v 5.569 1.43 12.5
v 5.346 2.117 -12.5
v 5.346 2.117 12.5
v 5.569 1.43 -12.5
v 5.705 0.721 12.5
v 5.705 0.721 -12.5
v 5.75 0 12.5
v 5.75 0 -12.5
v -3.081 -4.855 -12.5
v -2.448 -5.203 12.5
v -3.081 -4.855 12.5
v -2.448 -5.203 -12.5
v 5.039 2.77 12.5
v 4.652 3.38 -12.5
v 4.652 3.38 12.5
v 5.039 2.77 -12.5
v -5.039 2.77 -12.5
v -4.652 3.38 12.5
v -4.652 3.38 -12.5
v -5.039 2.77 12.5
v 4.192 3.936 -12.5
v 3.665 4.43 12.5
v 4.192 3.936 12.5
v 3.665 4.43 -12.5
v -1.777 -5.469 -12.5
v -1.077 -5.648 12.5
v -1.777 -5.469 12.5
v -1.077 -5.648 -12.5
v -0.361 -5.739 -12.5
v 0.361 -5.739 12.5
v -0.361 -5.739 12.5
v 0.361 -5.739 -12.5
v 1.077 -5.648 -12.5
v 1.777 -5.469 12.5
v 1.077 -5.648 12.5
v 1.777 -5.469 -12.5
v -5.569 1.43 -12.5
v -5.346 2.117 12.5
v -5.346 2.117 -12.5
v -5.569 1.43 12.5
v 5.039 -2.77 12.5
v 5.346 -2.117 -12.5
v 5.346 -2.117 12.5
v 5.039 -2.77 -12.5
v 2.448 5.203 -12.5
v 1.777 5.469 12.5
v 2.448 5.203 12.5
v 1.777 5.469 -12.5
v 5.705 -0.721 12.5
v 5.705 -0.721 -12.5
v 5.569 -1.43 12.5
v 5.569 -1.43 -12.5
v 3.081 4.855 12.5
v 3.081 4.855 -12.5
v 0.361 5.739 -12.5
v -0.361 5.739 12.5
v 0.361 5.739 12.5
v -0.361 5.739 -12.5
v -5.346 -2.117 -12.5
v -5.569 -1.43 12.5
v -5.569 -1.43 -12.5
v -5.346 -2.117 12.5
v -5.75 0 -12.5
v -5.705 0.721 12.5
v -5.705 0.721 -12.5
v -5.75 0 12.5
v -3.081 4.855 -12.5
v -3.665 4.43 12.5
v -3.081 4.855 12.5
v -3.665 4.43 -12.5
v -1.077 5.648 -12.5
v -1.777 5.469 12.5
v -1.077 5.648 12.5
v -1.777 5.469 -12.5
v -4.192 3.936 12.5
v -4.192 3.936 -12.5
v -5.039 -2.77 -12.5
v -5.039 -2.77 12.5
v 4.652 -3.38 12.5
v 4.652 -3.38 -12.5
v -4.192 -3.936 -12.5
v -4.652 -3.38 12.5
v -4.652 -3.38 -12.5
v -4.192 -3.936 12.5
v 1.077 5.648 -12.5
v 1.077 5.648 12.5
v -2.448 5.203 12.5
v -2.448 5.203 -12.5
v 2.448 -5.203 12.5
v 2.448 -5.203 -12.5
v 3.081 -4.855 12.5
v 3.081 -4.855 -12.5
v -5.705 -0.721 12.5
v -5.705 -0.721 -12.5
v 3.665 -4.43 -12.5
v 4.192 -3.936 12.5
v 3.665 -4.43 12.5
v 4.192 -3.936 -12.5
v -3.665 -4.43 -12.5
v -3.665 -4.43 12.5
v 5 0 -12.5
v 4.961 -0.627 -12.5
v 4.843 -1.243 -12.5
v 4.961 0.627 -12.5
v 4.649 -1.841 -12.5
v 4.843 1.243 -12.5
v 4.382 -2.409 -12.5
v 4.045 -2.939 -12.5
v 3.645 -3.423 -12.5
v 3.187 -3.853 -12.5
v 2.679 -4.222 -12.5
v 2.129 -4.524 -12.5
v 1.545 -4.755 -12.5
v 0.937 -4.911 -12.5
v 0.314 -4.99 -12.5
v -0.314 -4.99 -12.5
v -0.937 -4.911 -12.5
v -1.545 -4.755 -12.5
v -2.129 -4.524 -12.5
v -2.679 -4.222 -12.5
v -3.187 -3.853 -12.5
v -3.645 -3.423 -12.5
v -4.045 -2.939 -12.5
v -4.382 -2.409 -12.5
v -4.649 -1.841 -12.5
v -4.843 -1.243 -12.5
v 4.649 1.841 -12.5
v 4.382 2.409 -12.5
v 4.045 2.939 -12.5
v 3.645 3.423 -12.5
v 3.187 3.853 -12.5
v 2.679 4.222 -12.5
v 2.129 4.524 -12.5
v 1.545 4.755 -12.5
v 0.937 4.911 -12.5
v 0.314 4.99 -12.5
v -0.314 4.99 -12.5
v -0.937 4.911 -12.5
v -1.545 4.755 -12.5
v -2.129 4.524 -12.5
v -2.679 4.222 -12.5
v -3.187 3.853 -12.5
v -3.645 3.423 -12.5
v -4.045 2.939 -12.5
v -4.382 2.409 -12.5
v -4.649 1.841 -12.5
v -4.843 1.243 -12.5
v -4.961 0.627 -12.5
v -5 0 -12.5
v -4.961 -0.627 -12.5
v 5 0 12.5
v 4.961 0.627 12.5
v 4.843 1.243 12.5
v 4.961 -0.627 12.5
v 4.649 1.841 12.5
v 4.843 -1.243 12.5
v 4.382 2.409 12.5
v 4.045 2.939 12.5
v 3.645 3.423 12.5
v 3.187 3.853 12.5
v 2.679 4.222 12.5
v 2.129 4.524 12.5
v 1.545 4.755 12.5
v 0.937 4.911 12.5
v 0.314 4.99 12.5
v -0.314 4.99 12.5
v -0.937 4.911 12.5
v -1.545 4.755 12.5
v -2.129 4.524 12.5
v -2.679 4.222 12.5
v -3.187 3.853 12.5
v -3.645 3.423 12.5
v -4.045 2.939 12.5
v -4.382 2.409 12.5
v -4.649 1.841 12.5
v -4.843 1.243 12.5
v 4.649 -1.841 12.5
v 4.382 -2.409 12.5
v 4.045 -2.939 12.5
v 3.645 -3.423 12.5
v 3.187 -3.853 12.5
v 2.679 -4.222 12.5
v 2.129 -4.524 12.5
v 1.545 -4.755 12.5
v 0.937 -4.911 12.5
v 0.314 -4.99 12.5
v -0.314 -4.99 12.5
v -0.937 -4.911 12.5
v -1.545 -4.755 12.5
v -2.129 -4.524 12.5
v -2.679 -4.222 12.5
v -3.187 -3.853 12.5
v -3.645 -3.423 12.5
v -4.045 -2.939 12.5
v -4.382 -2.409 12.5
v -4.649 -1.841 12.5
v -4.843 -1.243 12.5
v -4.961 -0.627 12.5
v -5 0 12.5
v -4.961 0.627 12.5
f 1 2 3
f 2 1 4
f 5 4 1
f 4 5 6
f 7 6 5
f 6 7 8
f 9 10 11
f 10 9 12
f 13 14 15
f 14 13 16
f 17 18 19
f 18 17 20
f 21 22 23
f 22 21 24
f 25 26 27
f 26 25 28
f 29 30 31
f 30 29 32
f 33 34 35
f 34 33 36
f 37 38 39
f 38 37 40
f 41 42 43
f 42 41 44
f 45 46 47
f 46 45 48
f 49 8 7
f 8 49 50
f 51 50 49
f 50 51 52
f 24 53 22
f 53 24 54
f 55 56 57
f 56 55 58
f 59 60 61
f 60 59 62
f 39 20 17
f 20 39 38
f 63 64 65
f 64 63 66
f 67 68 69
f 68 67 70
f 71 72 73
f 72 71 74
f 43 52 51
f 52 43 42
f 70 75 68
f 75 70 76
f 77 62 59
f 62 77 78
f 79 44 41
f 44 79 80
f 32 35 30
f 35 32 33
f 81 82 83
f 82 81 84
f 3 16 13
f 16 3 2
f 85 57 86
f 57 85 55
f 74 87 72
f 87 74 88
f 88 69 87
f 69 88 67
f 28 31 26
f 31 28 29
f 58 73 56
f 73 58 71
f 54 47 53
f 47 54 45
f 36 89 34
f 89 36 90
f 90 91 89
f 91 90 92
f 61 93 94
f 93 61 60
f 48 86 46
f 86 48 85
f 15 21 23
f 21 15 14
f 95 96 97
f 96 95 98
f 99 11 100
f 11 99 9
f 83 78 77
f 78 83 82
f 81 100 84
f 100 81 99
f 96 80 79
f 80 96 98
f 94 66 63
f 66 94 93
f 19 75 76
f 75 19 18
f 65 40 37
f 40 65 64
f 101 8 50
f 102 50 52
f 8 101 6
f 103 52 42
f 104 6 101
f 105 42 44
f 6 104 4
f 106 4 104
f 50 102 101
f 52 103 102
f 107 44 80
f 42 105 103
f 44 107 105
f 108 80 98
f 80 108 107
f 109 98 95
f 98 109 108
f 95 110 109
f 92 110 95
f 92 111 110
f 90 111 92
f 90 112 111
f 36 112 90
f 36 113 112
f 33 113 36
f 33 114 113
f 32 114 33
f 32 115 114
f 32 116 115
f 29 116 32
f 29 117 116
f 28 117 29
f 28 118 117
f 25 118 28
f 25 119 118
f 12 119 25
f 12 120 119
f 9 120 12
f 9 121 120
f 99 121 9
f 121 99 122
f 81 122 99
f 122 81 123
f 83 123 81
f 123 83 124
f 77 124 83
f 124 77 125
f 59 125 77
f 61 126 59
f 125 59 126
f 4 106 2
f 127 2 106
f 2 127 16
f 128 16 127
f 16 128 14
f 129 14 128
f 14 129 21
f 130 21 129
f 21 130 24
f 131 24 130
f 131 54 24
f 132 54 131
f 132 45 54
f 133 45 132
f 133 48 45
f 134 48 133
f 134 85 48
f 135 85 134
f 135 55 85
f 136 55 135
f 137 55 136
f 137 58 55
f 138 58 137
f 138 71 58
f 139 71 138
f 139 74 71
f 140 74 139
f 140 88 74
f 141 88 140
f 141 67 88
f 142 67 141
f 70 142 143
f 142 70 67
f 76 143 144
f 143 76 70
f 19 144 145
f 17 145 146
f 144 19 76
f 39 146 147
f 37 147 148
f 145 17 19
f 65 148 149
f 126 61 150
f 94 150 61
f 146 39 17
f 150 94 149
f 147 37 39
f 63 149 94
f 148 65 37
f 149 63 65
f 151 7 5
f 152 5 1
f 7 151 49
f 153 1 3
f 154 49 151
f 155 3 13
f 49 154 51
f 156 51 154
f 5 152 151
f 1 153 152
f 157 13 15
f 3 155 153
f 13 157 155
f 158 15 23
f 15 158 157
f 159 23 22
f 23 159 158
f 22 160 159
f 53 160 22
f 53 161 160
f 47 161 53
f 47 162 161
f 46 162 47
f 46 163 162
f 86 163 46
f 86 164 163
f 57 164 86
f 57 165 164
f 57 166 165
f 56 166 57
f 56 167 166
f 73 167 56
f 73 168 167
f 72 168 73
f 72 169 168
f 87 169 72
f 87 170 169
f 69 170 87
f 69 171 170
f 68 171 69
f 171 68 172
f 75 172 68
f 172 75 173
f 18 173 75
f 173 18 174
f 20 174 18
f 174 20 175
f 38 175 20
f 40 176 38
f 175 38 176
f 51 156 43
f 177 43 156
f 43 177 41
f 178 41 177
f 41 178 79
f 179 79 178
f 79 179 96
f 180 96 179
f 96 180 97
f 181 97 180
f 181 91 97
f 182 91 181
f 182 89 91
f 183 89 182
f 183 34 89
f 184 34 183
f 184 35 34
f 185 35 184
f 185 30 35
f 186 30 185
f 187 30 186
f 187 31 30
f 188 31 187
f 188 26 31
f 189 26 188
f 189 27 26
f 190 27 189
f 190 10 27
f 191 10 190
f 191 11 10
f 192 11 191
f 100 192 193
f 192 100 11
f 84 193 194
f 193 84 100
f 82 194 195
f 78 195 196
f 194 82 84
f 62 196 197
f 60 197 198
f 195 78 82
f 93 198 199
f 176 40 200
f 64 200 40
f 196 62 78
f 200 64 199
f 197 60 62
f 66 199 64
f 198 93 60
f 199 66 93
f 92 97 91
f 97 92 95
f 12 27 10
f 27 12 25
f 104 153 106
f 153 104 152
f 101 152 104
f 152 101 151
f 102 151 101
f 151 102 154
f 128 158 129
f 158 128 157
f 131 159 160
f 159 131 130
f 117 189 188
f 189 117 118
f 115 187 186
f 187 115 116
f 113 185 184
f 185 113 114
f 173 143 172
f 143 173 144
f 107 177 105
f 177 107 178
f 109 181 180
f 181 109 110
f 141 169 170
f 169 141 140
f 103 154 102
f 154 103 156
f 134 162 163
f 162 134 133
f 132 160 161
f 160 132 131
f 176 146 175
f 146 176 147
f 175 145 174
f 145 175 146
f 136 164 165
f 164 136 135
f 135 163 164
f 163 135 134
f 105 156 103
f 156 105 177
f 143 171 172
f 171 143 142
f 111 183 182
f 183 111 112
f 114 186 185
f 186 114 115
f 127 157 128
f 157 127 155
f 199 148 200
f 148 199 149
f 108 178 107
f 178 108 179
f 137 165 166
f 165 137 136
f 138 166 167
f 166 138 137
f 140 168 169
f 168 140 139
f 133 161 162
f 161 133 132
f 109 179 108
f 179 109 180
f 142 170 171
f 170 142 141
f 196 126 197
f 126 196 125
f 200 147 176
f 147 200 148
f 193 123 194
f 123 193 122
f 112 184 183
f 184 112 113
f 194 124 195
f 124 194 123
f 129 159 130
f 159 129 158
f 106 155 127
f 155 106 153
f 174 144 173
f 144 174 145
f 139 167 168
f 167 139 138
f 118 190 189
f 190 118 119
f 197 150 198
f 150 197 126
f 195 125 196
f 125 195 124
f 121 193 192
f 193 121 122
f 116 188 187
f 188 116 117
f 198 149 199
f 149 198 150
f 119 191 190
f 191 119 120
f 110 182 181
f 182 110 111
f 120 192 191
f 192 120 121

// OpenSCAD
$fn = 50;


difference() {
	union() {
		translate(v = [0, 0, -12.5000000000]) {
			cylinder(h = 25, r = 5.7500000000);
		}
	}
	union() {
		translate(v = [0, 0, -100.0000000000]) {
			cylinder(h = 200, r = 5.0000000000);
		}
	}
}
